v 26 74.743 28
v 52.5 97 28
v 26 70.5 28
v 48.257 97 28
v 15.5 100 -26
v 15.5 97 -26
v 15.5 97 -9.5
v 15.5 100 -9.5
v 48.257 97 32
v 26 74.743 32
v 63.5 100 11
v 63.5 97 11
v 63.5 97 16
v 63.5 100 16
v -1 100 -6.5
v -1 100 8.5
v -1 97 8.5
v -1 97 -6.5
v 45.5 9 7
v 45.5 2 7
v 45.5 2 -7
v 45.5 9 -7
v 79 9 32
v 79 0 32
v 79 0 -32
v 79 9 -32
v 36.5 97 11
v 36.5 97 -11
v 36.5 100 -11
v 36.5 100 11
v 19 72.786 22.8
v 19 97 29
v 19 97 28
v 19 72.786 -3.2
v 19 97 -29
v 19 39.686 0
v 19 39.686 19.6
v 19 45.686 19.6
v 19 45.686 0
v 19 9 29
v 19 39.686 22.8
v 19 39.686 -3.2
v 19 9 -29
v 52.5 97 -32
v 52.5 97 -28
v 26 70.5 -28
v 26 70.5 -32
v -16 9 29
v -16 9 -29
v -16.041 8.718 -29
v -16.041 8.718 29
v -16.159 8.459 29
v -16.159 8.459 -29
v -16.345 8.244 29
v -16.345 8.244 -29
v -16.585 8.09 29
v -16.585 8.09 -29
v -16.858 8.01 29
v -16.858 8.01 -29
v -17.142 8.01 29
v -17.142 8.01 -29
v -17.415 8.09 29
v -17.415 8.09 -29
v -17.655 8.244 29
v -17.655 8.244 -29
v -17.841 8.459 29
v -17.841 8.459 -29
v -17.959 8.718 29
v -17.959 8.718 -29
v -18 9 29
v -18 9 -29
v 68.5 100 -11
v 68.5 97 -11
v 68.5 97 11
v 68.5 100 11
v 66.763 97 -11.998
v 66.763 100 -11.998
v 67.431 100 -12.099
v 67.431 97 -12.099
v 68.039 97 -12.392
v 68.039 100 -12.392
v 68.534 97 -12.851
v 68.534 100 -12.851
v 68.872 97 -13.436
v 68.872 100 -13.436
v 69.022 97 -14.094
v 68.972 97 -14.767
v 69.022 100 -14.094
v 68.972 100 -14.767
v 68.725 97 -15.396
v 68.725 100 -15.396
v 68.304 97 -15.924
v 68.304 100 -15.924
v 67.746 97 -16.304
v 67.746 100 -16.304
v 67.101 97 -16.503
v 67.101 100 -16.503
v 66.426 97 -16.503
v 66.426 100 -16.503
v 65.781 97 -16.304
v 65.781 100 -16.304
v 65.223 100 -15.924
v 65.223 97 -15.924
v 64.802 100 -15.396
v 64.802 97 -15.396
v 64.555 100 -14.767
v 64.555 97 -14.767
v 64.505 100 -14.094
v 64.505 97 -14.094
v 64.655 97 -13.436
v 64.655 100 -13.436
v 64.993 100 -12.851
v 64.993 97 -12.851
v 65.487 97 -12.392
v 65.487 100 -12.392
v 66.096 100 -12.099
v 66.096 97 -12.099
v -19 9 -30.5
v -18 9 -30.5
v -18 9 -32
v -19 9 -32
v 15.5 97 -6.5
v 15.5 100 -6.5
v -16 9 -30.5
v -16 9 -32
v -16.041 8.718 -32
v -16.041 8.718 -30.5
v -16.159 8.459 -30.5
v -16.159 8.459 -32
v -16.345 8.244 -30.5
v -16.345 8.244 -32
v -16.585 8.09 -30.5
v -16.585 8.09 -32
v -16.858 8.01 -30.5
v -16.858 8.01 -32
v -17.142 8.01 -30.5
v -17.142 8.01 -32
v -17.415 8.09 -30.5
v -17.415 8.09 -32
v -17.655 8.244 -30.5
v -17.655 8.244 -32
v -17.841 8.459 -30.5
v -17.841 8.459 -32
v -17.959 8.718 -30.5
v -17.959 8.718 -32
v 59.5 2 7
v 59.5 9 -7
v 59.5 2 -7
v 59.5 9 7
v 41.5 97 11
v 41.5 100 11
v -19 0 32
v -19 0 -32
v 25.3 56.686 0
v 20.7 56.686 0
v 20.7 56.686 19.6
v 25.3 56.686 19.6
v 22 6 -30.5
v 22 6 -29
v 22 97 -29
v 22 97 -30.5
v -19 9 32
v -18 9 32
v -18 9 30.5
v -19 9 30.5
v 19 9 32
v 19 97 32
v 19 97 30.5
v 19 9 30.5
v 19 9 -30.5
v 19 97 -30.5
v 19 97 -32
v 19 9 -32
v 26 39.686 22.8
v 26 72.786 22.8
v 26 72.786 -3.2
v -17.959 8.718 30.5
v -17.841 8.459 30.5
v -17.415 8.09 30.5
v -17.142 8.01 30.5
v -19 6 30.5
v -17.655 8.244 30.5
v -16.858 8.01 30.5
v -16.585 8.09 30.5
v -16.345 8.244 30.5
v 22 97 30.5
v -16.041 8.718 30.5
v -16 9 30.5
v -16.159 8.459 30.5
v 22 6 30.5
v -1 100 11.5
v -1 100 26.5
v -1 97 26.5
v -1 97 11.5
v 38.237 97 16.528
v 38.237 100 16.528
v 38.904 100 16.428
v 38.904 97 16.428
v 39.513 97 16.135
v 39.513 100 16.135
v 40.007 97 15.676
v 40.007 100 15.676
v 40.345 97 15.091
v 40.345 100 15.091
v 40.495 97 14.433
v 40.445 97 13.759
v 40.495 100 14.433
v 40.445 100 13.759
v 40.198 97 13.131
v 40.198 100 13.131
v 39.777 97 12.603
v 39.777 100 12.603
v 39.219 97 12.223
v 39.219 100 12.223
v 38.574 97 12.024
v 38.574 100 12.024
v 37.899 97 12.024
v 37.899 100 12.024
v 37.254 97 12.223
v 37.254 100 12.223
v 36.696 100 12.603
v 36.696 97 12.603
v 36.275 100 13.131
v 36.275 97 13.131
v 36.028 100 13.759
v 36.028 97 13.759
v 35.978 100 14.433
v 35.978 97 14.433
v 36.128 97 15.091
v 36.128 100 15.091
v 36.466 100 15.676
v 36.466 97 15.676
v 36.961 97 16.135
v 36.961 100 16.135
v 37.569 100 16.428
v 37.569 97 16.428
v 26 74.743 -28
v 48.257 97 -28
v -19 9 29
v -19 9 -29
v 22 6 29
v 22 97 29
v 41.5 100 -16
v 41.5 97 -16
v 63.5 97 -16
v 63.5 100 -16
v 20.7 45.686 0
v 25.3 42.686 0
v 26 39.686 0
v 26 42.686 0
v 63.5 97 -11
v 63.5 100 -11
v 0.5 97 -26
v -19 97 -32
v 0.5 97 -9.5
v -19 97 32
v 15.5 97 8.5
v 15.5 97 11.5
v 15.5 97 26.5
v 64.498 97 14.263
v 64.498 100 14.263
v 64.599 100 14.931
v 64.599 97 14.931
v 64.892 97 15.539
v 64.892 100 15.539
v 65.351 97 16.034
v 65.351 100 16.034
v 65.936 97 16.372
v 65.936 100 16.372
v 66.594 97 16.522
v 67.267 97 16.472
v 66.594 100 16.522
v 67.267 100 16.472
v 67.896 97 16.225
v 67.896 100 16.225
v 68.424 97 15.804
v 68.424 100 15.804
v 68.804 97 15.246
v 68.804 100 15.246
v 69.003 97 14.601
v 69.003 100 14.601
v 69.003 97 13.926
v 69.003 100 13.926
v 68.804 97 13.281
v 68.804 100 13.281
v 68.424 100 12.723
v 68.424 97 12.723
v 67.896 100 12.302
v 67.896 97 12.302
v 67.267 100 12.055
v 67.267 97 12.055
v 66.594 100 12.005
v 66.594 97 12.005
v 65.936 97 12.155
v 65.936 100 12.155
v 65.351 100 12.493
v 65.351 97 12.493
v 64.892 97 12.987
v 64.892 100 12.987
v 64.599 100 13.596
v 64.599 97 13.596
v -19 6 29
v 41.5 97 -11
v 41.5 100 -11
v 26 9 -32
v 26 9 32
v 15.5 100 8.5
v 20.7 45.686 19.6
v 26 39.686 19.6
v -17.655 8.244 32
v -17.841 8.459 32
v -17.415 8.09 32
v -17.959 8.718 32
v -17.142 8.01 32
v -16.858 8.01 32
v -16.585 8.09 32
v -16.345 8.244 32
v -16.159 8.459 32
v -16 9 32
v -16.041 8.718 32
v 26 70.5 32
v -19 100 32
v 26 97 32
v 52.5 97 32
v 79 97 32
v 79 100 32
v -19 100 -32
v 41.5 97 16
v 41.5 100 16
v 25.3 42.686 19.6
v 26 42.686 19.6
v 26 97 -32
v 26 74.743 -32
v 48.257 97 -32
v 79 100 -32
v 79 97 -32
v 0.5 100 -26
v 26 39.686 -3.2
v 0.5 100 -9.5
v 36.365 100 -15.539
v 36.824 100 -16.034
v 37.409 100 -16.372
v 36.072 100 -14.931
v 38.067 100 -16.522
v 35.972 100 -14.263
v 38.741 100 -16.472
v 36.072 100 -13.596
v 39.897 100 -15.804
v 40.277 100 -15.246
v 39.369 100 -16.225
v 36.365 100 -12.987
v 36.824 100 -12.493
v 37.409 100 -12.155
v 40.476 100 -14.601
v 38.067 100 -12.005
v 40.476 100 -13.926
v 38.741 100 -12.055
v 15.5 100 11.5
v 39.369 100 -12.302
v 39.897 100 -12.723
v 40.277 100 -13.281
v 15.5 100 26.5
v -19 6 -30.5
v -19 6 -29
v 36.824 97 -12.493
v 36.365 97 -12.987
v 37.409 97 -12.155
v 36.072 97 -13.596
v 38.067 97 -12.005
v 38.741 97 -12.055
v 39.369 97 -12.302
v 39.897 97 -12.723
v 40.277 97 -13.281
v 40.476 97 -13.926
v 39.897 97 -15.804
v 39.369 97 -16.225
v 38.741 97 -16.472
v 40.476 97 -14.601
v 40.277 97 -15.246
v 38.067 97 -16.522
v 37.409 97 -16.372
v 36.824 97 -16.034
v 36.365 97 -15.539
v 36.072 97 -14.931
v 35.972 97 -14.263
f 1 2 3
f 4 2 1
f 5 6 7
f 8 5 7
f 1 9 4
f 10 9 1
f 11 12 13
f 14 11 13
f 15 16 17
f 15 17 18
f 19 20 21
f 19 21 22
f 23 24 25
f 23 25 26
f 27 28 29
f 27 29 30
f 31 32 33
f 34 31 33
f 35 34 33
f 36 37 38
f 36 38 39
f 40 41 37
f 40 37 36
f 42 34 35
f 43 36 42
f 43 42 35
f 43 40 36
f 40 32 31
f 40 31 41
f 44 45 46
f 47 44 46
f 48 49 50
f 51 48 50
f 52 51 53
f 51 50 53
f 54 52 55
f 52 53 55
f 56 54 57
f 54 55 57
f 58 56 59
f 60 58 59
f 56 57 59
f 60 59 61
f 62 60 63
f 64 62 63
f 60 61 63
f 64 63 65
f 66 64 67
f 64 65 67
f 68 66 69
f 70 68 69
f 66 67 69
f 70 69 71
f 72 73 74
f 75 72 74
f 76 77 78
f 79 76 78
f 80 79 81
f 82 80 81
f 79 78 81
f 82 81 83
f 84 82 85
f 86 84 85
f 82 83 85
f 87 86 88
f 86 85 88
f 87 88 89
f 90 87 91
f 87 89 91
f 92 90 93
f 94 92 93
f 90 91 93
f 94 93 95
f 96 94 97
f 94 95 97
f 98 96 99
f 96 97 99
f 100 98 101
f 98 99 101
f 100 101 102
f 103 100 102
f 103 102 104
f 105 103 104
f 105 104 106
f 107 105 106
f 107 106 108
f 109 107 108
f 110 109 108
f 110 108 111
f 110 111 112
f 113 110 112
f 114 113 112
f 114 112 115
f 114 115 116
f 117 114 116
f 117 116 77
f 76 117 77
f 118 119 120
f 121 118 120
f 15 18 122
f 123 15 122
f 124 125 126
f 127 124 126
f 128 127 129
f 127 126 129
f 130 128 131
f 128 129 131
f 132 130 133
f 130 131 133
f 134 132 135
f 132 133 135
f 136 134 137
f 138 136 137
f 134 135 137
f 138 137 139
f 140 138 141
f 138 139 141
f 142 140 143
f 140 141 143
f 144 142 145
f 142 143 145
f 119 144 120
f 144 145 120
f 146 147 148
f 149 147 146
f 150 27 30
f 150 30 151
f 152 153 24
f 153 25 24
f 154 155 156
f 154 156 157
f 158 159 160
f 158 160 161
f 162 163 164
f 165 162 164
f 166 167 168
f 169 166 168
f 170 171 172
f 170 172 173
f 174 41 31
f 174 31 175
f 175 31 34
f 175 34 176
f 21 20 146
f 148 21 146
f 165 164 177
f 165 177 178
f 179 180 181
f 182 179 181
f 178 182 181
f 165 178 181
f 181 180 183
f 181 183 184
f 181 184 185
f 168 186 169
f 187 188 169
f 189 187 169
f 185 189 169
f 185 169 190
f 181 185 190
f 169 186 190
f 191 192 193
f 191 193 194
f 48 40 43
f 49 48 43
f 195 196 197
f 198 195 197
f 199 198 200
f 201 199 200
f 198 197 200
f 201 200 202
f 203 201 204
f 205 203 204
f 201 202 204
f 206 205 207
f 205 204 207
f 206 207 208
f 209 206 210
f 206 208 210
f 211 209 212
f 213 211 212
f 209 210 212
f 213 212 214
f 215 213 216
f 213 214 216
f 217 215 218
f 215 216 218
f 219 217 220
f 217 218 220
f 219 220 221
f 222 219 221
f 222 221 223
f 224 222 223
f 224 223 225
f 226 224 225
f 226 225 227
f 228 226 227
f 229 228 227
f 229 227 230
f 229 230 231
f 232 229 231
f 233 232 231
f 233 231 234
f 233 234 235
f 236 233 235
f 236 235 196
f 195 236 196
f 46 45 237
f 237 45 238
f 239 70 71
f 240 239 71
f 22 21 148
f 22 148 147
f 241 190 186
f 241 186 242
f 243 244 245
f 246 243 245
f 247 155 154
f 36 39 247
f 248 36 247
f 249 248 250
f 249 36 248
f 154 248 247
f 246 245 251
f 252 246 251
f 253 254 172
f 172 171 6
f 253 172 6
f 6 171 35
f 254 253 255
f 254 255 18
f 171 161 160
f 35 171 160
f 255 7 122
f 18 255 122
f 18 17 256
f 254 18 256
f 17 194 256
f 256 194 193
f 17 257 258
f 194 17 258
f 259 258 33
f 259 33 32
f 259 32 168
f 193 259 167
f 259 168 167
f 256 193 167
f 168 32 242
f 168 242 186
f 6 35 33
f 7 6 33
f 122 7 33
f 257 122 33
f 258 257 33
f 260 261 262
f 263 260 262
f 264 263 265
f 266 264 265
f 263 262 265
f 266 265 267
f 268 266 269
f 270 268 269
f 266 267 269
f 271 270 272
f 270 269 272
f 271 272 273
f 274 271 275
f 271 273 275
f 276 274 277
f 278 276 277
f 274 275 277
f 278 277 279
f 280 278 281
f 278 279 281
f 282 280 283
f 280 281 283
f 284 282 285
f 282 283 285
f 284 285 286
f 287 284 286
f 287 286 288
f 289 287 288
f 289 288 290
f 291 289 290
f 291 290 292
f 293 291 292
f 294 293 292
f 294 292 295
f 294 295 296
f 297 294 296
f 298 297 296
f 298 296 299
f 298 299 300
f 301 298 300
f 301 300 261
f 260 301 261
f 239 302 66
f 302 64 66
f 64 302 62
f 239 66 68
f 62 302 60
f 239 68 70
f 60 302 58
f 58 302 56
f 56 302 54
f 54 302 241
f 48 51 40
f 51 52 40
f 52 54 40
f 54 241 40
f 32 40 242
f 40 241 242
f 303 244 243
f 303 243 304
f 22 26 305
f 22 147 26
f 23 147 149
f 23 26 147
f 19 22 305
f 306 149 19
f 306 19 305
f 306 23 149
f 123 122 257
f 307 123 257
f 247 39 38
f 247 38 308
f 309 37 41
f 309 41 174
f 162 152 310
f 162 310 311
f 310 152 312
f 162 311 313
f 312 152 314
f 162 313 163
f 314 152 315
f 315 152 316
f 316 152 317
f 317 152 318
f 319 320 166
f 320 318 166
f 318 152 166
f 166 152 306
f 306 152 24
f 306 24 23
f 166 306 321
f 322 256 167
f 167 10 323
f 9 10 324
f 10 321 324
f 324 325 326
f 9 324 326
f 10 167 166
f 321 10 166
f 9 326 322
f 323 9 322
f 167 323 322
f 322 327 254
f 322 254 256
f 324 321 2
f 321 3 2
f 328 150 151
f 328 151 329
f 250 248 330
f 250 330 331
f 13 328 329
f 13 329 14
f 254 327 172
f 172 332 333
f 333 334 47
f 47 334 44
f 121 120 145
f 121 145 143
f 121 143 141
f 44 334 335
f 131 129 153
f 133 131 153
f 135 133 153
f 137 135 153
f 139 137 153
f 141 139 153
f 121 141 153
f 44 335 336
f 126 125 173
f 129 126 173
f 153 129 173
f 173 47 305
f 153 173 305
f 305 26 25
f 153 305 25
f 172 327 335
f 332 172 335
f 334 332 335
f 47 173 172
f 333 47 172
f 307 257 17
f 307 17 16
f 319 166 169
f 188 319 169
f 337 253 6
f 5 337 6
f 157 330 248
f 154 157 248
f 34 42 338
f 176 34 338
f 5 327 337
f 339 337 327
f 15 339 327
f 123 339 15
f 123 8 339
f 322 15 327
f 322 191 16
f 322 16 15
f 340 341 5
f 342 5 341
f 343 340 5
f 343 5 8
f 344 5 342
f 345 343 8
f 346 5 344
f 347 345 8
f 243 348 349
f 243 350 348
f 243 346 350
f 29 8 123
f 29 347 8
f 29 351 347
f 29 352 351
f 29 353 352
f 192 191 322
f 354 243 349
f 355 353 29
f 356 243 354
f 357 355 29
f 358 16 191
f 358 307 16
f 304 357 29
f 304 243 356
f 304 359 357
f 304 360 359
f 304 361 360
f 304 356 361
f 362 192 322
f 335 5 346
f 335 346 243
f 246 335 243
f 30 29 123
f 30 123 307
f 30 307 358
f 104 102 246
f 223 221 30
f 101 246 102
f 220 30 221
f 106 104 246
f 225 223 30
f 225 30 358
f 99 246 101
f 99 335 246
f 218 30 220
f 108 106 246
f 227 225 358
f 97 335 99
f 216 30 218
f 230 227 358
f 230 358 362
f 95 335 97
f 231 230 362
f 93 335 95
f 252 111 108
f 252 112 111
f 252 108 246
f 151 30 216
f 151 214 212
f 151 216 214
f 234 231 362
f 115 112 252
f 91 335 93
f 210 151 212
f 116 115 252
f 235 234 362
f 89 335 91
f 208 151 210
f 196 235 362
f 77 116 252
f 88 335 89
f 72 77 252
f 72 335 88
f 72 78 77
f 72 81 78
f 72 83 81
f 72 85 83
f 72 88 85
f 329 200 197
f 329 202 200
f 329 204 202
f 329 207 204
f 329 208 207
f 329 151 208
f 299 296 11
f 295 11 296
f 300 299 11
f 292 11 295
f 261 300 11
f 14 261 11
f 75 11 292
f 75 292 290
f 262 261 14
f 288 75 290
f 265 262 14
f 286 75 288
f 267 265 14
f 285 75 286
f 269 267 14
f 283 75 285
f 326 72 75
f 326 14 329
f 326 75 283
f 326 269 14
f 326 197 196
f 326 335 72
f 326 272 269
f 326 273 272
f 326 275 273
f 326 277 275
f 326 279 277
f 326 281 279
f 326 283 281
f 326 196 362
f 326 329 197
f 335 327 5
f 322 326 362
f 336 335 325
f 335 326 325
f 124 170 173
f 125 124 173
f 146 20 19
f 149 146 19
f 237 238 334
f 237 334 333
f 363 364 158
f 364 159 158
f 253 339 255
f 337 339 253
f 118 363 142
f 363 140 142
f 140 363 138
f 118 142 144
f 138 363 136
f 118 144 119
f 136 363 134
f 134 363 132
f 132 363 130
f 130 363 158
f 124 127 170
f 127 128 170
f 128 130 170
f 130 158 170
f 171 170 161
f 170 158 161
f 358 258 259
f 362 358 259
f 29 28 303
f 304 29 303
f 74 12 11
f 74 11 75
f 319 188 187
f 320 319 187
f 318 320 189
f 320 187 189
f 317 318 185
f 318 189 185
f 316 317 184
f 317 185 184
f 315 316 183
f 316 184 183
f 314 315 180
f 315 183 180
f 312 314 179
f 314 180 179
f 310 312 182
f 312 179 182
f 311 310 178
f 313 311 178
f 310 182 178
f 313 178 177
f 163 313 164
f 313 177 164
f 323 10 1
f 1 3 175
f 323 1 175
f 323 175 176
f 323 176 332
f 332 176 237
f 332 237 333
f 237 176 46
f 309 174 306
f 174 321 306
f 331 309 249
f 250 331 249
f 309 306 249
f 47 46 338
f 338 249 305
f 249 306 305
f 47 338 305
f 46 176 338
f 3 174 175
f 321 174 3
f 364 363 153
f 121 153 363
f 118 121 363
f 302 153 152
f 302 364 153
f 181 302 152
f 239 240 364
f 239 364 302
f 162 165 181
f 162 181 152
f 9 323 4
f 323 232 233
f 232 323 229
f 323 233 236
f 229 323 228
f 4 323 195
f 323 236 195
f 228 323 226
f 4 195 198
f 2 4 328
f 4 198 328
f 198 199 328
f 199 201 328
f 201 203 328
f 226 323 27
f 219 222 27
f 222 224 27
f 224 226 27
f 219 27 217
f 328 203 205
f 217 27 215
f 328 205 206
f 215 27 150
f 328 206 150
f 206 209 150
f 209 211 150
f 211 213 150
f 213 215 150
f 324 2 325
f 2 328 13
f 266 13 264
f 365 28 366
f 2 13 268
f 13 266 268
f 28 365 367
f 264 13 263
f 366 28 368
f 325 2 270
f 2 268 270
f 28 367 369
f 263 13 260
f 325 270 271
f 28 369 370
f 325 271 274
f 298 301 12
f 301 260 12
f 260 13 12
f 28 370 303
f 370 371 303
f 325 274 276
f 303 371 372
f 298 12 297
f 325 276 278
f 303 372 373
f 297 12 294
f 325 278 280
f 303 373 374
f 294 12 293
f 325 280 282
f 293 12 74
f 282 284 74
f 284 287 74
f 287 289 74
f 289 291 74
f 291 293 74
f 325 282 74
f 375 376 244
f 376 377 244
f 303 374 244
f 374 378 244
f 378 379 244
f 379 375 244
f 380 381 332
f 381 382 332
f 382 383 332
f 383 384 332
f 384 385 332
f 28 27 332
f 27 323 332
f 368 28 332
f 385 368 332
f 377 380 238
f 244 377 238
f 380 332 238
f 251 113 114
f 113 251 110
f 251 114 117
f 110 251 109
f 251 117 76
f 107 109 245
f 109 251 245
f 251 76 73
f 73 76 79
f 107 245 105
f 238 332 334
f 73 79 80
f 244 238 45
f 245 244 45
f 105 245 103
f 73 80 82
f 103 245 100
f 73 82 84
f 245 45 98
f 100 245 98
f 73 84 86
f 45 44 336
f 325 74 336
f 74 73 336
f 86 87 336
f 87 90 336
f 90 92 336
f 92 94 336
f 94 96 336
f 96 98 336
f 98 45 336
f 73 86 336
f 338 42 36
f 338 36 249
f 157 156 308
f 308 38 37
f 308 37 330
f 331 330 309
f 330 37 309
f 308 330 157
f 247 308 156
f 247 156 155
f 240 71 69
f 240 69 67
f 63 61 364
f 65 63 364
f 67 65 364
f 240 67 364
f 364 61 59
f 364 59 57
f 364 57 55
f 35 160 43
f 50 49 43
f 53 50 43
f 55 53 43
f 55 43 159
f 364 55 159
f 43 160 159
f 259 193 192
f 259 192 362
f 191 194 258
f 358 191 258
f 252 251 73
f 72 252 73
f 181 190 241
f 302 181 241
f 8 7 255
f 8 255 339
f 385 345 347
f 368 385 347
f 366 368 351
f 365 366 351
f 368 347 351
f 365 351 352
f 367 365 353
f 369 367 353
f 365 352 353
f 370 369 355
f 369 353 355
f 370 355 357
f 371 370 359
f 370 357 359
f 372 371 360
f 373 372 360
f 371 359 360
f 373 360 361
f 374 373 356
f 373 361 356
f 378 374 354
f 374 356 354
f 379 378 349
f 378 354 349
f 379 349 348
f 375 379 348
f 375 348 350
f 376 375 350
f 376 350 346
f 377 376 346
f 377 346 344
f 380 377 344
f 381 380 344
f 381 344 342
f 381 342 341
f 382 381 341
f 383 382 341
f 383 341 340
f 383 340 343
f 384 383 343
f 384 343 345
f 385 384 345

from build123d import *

# Parameters (mm, degrees)
EXTRUDE_2_DEPTH           = 31
SKETCH_2_W                = 8
SKETCH_2_H                = 8
CUT_EXTRUDE_1_DEPTH       = 4
EXTRUDE_4_DEPTH           = 3
EXTRUDE_5_DEPTH           = 3
SKETCH_10_W               = 22
SKETCH_10_H               = 11
CUT_EXTRUDE_2_DEPTH       = 118.345643294
SKETCH_11_W               = 0.7
SKETCH_11_H               = 28
CUT_EXTRUDE_3_DEPTH       = 118.345643294
SKETCH_12_W               = 0.7
SKETCH_12_H               = 28
CUT_EXTRUDE_4_DEPTH       = 118.345643294
SKETCH_13_W               = 20.6
SKETCH_13_H               = 11
CUT_EXTRUDE_6_DEPTH       = 0.7
SKETCH_15_W               = 20.6
SKETCH_15_H               = 14
CUT_EXTRUDE_7_DEPTH       = 0.7
SKETCH_17_W               = 15
SKETCH_17_H               = 15
CUT_EXTRUDE_8_DEPTH       = 129.883668477
SKETCH_18_W               = 62
SKETCH_18_H               = 3
EXTRUDE_6_DEPTH           = 3
SKETCH_20_W               = 62
SKETCH_20_H               = 9
EXTRUDE_7_DEPTH           = 3
SKETCH_22_W               = 15
SKETCH_22_H               = 15
CUT_EXTRUDE_10_DEPTH      = 129.883668477
SKETCH_23_W               = 13.5
SKETCH_23_H               = 16.5
CUT_EXTRUDE_11_DEPTH      = 129.883668477
SKETCH_26_W               = 32
SKETCH_26_H               = 22
CUT_EXTRUDE_14_DEPTH      = 129.883668477
SKETCH_29_W               = 22
SKETCH_29_H               = 32
CUT_EXTRUDE_15_DEPTH      = 129.883668477
CUT_EXTRUDE_16_REACH      = 133.156
SKETCH_30_R               = 1.263405553
SKETCH_31_W               = 25
SKETCH_31_H               = 1.5
CUT_EXTRUDE_18_DEPTH      = 3
SKETCH_32_W               = 3
SKETCH_32_H               = 1.5
CUT_EXTRUDE_19_DEPTH      = 88
SKETCH_33_W               = 3
SKETCH_33_H               = 1.5
CUT_EXTRUDE_20_DEPTH      = 17
SKETCH_34_W               = 1.5
SKETCH_34_H               = 43.313673025
CUT_EXTRUDE_21_DEPTH      = 3
SKETCH_35_R               = 1
CUT_EXTRUDE_23_DEPTH      = 142.721557993
SKETCH_39_R               = 2.265
CUT_EXTRUDE_24_DEPTH      = 10
SKETCH_40_W               = 15
SKETCH_40_H               = 3
CUT_EXTRUDE_25_DEPTH      = 1.5
SKETCH_41_W               = 15
SKETCH_41_H               = 3
CUT_EXTRUDE_26_DEPTH      = 1.5
SKETCH_42_W               = 16.5
SKETCH_42_H               = 3
CUT_EXTRUDE_27_DEPTH      = 1.5
SKETCH_43_W               = 7
SKETCH_43_H               = 28
CUT_EXTRUDE_28_DEPTH      = 1.5
CUT_EXTRUDE_29_DEPTH      = 1
SKETCH_45_W               = 19.6
SKETCH_45_H               = 11
CUT_EXTRUDE_30_DEPTH      = 1
EXTRUDE_8_DEPTH           = 1
EXTRUDE_START             = 1
EXTRUDE_9_DEPTH           = 1
EXTRUDE_10_DEPTH          = 1
CUT_EXTRUDE_31_DEPTH      = 1
EXTRUDE_11_DEPTH          = 1
SKETCH_51_W               = 3
SKETCH_51_H               = 43.313673025
CUT_EXTRUDE_32_DEPTH      = 1
SKETCH_52_W               = 3
SKETCH_52_H               = 43.313673025
EXTRUDE_12_DEPTH          = 1
CUT_EXTRUDE_START         = -1
CUT_EXTRUDE_33_DEPTH      = 1
EXTRUDE_13_DEPTH          = 1
SKETCH_56_W               = 64
SKETCH_56_H               = 3
EXTRUDE_14_DEPTH          = 1
EXTRUDE_15_DEPTH          = 1
CUT_EXTRUDE_34_DEPTH      = 12.1
SKETCH_60_W               = 7.5
SKETCH_60_H               = 40.1
CUT_EXTRUDE_35_DEPTH      = 118.613774703
EXTRUDE_16_DEPTH          = 7.5
CUT_EXTRUDE_37_DEPTH      = 7.5
SKETCH_63_W               = 6.2
SKETCH_63_H               = 0.313673025
CUT_EXTRUDE_38_DEPTH      = 120.469661421
SKETCH_66_W               = 7
SKETCH_66_H               = 40.1
CUT_EXTRUDE_39_DEPTH      = 3.2
EXTRUDE_17_DEPTH          = 3.2
CUT_EXTRUDE_40_DEPTH      = 3.2
EXTRUDE_18_DEPTH          = 48.2
SKETCH_71_W               = 4.6
SKETCH_71_H               = 19.6
EXTRUDE_19_DEPTH          = 14
SKETCH_72_W               = 0.7
SKETCH_72_H               = 19.6
EXTRUDE_20_DEPTH          = 14
SKETCH_73_W               = 1.7
SKETCH_73_H               = 19.6
EXTRUDE_21_DEPTH          = 14
SKETCH_74_W               = 7
SKETCH_74_H               = 26
CUT_EXTRUDE_41_DEPTH      = 5
SKETCH_75_W               = 7
SKETCH_75_H               = 26
CUT_EXTRUDE_42_DEPTH      = 2
SKETCH_76_W               = 7
SKETCH_76_H               = 3.2
EXTRUDE_22_DEPTH          = 14
SKETCH_77_W               = 7
SKETCH_77_H               = 3.2
EXTRUDE_23_DEPTH          = 14
CUT_EXTRUDE_43_DEPTH      = 143.16187956
CUT_EXTRUDE_43_DEPTH_BACK = 143.16187956
SKETCH_79_W               = 8
SKETCH_79_H               = 4
CUT_EXTRUDE_44_DEPTH      = 3
SKETCH_80_W               = 11
SKETCH_80_H               = 4
CUT_EXTRUDE_45_DEPTH      = 3
SKETCH_81_W               = 11
SKETCH_81_H               = 4
CUT_EXTRUDE_46_DEPTH      = 3
SKETCH_82_W               = 14
SKETCH_82_H               = 4
CUT_EXTRUDE_47_DEPTH      = 3
SKETCH_83_W               = 14
SKETCH_83_H               = 14
CUT_EXTRUDE_48_DEPTH      = 3
SKETCH_84_W               = 64
SKETCH_84_H               = 3
EXTRUDE_24_DEPTH          = 15
EXTRUDE_25_DEPTH          = 15
EXTRUDE_26_DEPTH          = 20
SKETCH_87_R               = 1
CUT_EXTRUDE_49_DEPTH      = 143.607853921


with BuildPart() as part:
    # 草图1 → 凸台-拉伸2 (new, symmetric)
    with BuildSketch(Plane.XY):
        Polygon((0, 0), (79, 0), (79, 9), (26, 9), (26, 97), (79, 97), (79, 100), (0, 100), (0, 97), (19, 97), (19, 9), (0, 9), align=None)
    extrude(amount=EXTRUDE_2_DEPTH, both=True)

    # 草图2 → 切除-拉伸1 (cut)
    with BuildSketch(Plane(origin=(0, 9, 0), x_dir=(1, 0, 0), z_dir=(0, 1, 0))):
        with Locations((52.5, 0)):
            Rectangle(SKETCH_2_W, SKETCH_2_H)
    extrude(amount=-CUT_EXTRUDE_1_DEPTH, mode=Mode.SUBTRACT)

    # 草图5 → 凸台-拉伸4 (add)
    with BuildSketch(Plane.XY.offset(31)):
        Polygon((26, 70.5), (26, 74.742640687), (48.257359313, 97), (52.5, 97), align=None)
    extrude(amount=-EXTRUDE_4_DEPTH)

    # 草图9 → 凸台-拉伸5 (add)
    with BuildSketch(Plane(origin=(0, 0, -31), x_dir=(-1, 0, 0), z_dir=(0, 0, -1))):
        Polygon((-52.5, 97), (-26, 70.5), (-26, 74.742640687), (-48.257359313, 97), align=None)
    extrude(amount=-EXTRUDE_5_DEPTH)

    # 草图10 → 切除-拉伸2 (cut, through all)
    with BuildSketch(Plane(origin=(26, 0, 0), x_dir=(0, 0, -1), z_dir=(1, 0, 0))):
        with Locations((-20, 48.186326975)):
            Rectangle(SKETCH_10_W, SKETCH_10_H)
    extrude(amount=-CUT_EXTRUDE_2_DEPTH, mode=Mode.SUBTRACT)

    # 草图11 → 切除-拉伸3 (cut, through all)
    with BuildSketch(Plane(origin=(26, 0, 0), x_dir=(0, 0, -1), z_dir=(1, 0, 0))):
        with Locations((-9.35, 39.686326975)):
            Rectangle(SKETCH_11_W, SKETCH_11_H)
    extrude(amount=-CUT_EXTRUDE_3_DEPTH, mode=Mode.SUBTRACT)

    # 草图12 → 切除-拉伸4 (cut, through all)
    with BuildSketch(Plane(origin=(26, 0, 0), x_dir=(0, 0, -1), z_dir=(1, 0, 0))):
        with Locations((-30.65, 39.686326975)):
            Rectangle(SKETCH_12_W, SKETCH_12_H)
    extrude(amount=-CUT_EXTRUDE_4_DEPTH, mode=Mode.SUBTRACT)

    # 草图13 → 切除-拉伸6 (cut)
    with BuildSketch(Plane.ZY.offset(-19)):
        with Locations((20, 37.186326975)):
            Rectangle(SKETCH_13_W, SKETCH_13_H)
    extrude(amount=-CUT_EXTRUDE_6_DEPTH, mode=Mode.SUBTRACT)

    # 草图15 → 切除-拉伸7 (cut)
    with BuildSketch(Plane(origin=(26, 0, 0), x_dir=(0, 0, -1), z_dir=(1, 0, 0))):
        with Locations((-20, 35.686326975)):
            Rectangle(SKETCH_15_W, SKETCH_15_H)
    extrude(amount=-CUT_EXTRUDE_7_DEPTH, mode=Mode.SUBTRACT)

    # 草图17 → 切除-拉伸8 (cut, through all)
    with BuildSketch(Plane.XZ.offset(-97)):
        with Locations((8, 19)):
            Rectangle(SKETCH_17_W, SKETCH_17_H)
    extrude(amount=-CUT_EXTRUDE_8_DEPTH, mode=Mode.SUBTRACT)

    # 草图18 → 凸台-拉伸6 (add)
    with BuildSketch(Plane.ZY):
        with Locations((0, 98.5)):
            Rectangle(SKETCH_18_W, SKETCH_18_H)
    extrude(amount=EXTRUDE_6_DEPTH)

    # 草图20 → 凸台-拉伸7 (add)
    with BuildSketch(Plane.ZY):
        with Locations((0, 4.5)):
            Rectangle(SKETCH_20_W, SKETCH_20_H)
    extrude(amount=EXTRUDE_7_DEPTH)

    # 草图22 → 切除-拉伸10 (cut, through all)
    with BuildSketch(Plane.XZ.offset(-97)):
        with Locations((8, 1)):
            Rectangle(SKETCH_22_W, SKETCH_22_H)
    extrude(amount=-CUT_EXTRUDE_10_DEPTH, mode=Mode.SUBTRACT)

    # 草图23 → 切除-拉伸11 (cut, through all)
    with BuildSketch(Plane.XZ.offset(-97)):
        with Locations((8.75, -17.75)):
            Rectangle(SKETCH_23_W, SKETCH_23_H)
    extrude(amount=-CUT_EXTRUDE_11_DEPTH, mode=Mode.SUBTRACT)

    # 草图26 → 切除-拉伸14 (cut, through all)
    with BuildSketch(Plane.XZ.offset(-97)):
        with Locations((52.5, 0)):
            Rectangle(SKETCH_26_W, SKETCH_26_H)
    extrude(amount=-CUT_EXTRUDE_14_DEPTH, mode=Mode.SUBTRACT)

    # 草图29 → 切除-拉伸15 (cut, through all)
    with BuildSketch(Plane.XZ.offset(-97)):
        with Locations((52.5, 0)):
            Rectangle(SKETCH_29_W, SKETCH_29_H)
    extrude(amount=-CUT_EXTRUDE_15_DEPTH, mode=Mode.SUBTRACT)

    # 草图30 → 切除-拉伸16 (cut, up to next)
    with BuildSketch(Plane(origin=(0, 100, 0), x_dir=(1, 0, 0), z_dir=(0, 1, 0)), mode=Mode.PRIVATE) as cut_extrude_16_sk1:
        with Locations((38.236594447, -14.263405553)):
            Circle(SKETCH_30_R)
    cut_extrude_16_tool1 = extrude(cut_extrude_16_sk1.sketch, amount=-CUT_EXTRUDE_16_REACH, mode=Mode.PRIVATE) & part.part
    # 草图30 → 切除-拉伸16 (cut, up to next)
    with BuildSketch(Plane(origin=(0, 100, 0), x_dir=(1, 0, 0), z_dir=(0, 1, 0)), mode=Mode.PRIVATE) as cut_extrude_16_sk2:
        with Locations((66.763405553, -14.263405553)):
            Circle(SKETCH_30_R)
    cut_extrude_16_tool2 = extrude(cut_extrude_16_sk2.sketch, amount=-CUT_EXTRUDE_16_REACH, mode=Mode.PRIVATE) & part.part
    # 草图30 → 切除-拉伸16 (cut, up to next)
    with BuildSketch(Plane(origin=(0, 100, 0), x_dir=(1, 0, 0), z_dir=(0, 1, 0)), mode=Mode.PRIVATE) as cut_extrude_16_sk3:
        with Locations((66.763405553, 14.263405553)):
            Circle(SKETCH_30_R)
    cut_extrude_16_tool3 = extrude(cut_extrude_16_sk3.sketch, amount=-CUT_EXTRUDE_16_REACH, mode=Mode.PRIVATE) & part.part
    # 草图30 → 切除-拉伸16 (cut, up to next)
    with BuildSketch(Plane(origin=(0, 100, 0), x_dir=(1, 0, 0), z_dir=(0, 1, 0)), mode=Mode.PRIVATE) as cut_extrude_16_sk4:
        with Locations((38.236594447, 14.263405553)):
            Circle(SKETCH_30_R)
    cut_extrude_16_tool4 = extrude(cut_extrude_16_sk4.sketch, amount=-CUT_EXTRUDE_16_REACH, mode=Mode.PRIVATE) & part.part
    add(cut_extrude_16_tool1.solids().sort_by_distance((38.236594, 100, 14.263406))[0], mode=Mode.SUBTRACT)
    add(cut_extrude_16_tool2.solids().sort_by_distance((66.763406, 100, 14.263406))[0], mode=Mode.SUBTRACT)
    add(cut_extrude_16_tool3.solids().sort_by_distance((66.763406, 100, -14.263406))[0], mode=Mode.SUBTRACT)
    add(cut_extrude_16_tool4.solids().sort_by_distance((38.236594, 100, -14.263406))[0], mode=Mode.SUBTRACT)

    # 草图31 → 切除-拉伸18 (cut)
    with BuildSketch(Plane(origin=(0, 9, 0), x_dir=(1, 0, 0), z_dir=(0, 1, 0))):
        with Locations((9.5, 28.75)):
            Rectangle(SKETCH_31_W, SKETCH_31_H)
        with Locations((9.5, -28.75)):
            Rectangle(SKETCH_31_W, SKETCH_31_H)
    extrude(amount=-CUT_EXTRUDE_18_DEPTH, mode=Mode.SUBTRACT)

    # 草图32 → 切除-拉伸19 (cut)
    with BuildSketch(Plane.XZ.offset(-9)):
        with Locations((20.5, -28.75)):
            Rectangle(SKETCH_32_W, SKETCH_32_H)
    extrude(amount=-CUT_EXTRUDE_19_DEPTH, mode=Mode.SUBTRACT)

    # 草图33 → 切除-拉伸20 (cut)
    with BuildSketch(Plane.XZ.offset(-9)):
        with Locations((20.5, 28.75)):
            Rectangle(SKETCH_33_W, SKETCH_33_H)
    extrude(amount=-CUT_EXTRUDE_20_DEPTH, mode=Mode.SUBTRACT)

    # 草图34 → 切除-拉伸21 (cut)
    with BuildSketch(Plane.ZY.offset(-19)):
        with Locations((28.75, 75.343163487)):
            Rectangle(SKETCH_34_W, SKETCH_34_H)
    extrude(amount=-CUT_EXTRUDE_21_DEPTH, mode=Mode.SUBTRACT)

    # 草图35 → 切除-拉伸23 (cut, through all)
    with BuildSketch(Plane.XY.offset(31)):
        with Locations((-1, 9)):
            Circle(SKETCH_35_R)
    extrude(amount=-CUT_EXTRUDE_23_DEPTH, mode=Mode.SUBTRACT)

    # 草图39 → 切除-拉伸24 (cut)
    with BuildSketch(Plane(origin=(0, 100, 0), x_dir=(1, 0, 0), z_dir=(0, 1, 0))):
        with Locations((66.763405553, -14.263405553)):
            Circle(SKETCH_39_R)
        with Locations((38.236594447, -14.263405553)):
            Circle(SKETCH_39_R)
        with Locations((66.763405553, 14.263405553)):
            Circle(SKETCH_39_R)
        with Locations((38.236594447, 14.263405553)):
            Circle(SKETCH_39_R)
    extrude(amount=-CUT_EXTRUDE_24_DEPTH, mode=Mode.SUBTRACT)

    # 草图40 → 切除-拉伸25 (cut)
    with BuildSketch(Plane(origin=(0.5, 0, 0), x_dir=(0, 0, -1), z_dir=(1, 0, 0))):
        with Locations((-19, 98.5)):
            Rectangle(SKETCH_40_W, SKETCH_40_H)
    extrude(amount=-CUT_EXTRUDE_25_DEPTH, mode=Mode.SUBTRACT)

    # 草图41 → 切除-拉伸26 (cut)
    with BuildSketch(Plane(origin=(0.5, 0, 0), x_dir=(0, 0, -1), z_dir=(1, 0, 0))):
        with Locations((-1, 98.5)):
            Rectangle(SKETCH_41_W, SKETCH_41_H)
    extrude(amount=-CUT_EXTRUDE_26_DEPTH, mode=Mode.SUBTRACT)

    # 草图42 → 切除-拉伸27 (cut)
    with BuildSketch(Plane(origin=(2, 0, 0), x_dir=(0, 0, -1), z_dir=(1, 0, 0))):
        with Locations((17.75, 98.5)):
            Rectangle(SKETCH_42_W, SKETCH_42_H)
    extrude(amount=-CUT_EXTRUDE_27_DEPTH, mode=Mode.SUBTRACT)

    # 草图43 → 切除-拉伸28 (cut)
    with BuildSketch(Plane.XY.offset(9)):
        with Locations((22.5, 39.686326975)):
            Rectangle(SKETCH_43_W, SKETCH_43_H)
    extrude(amount=-CUT_EXTRUDE_28_DEPTH, mode=Mode.SUBTRACT)

    # 草图44 → 切除-拉伸29 (cut)
    with BuildSketch(Plane(origin=(0, 0, 9.7), x_dir=(-1, 0, 0), z_dir=(0, 0, -1))):
        Polygon((-25.3, 42.686326975), (-25.3, 28.686326975), (-26, 28.686326975), (-26, 25.686326975), (-19, 25.686326975), (-19, 31.686326975), (-19.7, 31.686326975), (-19.7, 42.686326975), align=None)
    extrude(amount=-CUT_EXTRUDE_29_DEPTH, mode=Mode.SUBTRACT)

    # 草图45 → 切除-拉伸30 (cut)
    with BuildSketch(Plane.ZY.offset(-19.7)):
        with Locations((20.5, 37.186326975)):
            Rectangle(SKETCH_45_W, SKETCH_45_H)
    extrude(amount=-CUT_EXTRUDE_30_DEPTH, mode=Mode.SUBTRACT)

    # 草图46 → 凸台-拉伸8 (add)
    with BuildSketch(Plane.XY.offset(31)):
        Polygon((19, 53.686326975), (26, 53.686326975), (26, 70.5), (52.5, 97), (79, 97), (79, 100), (-3, 100), (-3, 97), (19, 97), align=None)
    extrude(amount=EXTRUDE_8_DEPTH)

    # 草图47 → 凸台-拉伸9 (add)
    with BuildSketch(Plane.XY.offset(31).offset(EXTRUDE_START)):
        with BuildLine():
            Line((-2, 9), (-3, 9))
            Line((-3, 9), (-3, 0))
            Line((-3, 0), (79, 0))
            Line((79, 0), (79, 9))
            Line((79, 9), (26, 9))
            Line((26, 9), (26, 25.686326975))
            Line((26, 25.686326975), (19, 25.686326975))
            Line((19, 25.686326975), (19, 9))
            Line((19, 9), (0, 9))
            ThreePointArc((0, 9), (-1, 8), (-2, 9))
        make_face()
    extrude(amount=-EXTRUDE_9_DEPTH)

    # 草图48 → 凸台-拉伸10 (add)
    with BuildSketch(Plane(origin=(0, 0, -31), x_dir=(-1, 0, 0), z_dir=(0, 0, -1))):
        with BuildLine():
            Line((3, 9), (2, 9))
            ThreePointArc((2, 9), (1, 8), (0, 9))
            Line((0, 9), (-19, 9))
            Line((-19, 9), (-19, 97))
            Line((-19, 97), (3, 97))
            Line((3, 97), (3, 100))
            Line((3, 100), (-79, 100))
            Line((-79, 100), (-79, 97))
            Line((-79, 97), (-52.5, 97))
            Line((-52.5, 97), (-26, 70.5))
            Line((-26, 70.5), (-26, 9))
            Line((-26, 9), (-79, 9))
            Line((-79, 9), (-79, 0))
            Line((-79, 0), (3, 0))
            Line((3, 0), (3, 9))
        make_face()
    extrude(amount=EXTRUDE_10_DEPTH)

    # 草图49 → 切除-拉伸31 (cut)
    with BuildSketch(Plane.XY.offset(-29.5)):
        with BuildLine():
            Line((19, 9), (0, 9))
            ThreePointArc((0, 9), (-1, 8), (-2, 9))
            Line((-2, 9), (-3, 9))
            Line((-3, 9), (-3, 6))
            Line((-3, 6), (22, 6))
            Line((22, 6), (22, 97))
            Line((22, 97), (19, 97))
            Line((19, 97), (19, 9))
        make_face()
    extrude(amount=-CUT_EXTRUDE_31_DEPTH, mode=Mode.SUBTRACT)

    # 草图50 → 凸台-拉伸11 (add)
    with BuildSketch(Plane(origin=(0, 0, -28), x_dir=(-1, 0, 0), z_dir=(0, 0, -1))):
        with BuildLine():
            Line((3, 9), (2, 9))
            ThreePointArc((2, 9), (1, 8), (0, 9))
            Line((0, 9), (-19, 9))
            Line((-19, 9), (-19, 97))
            Line((-19, 97), (-22, 97))
            Line((-22, 97), (-22, 6))
            Line((-22, 6), (3, 6))
            Line((3, 6), (3, 9))
        make_face()
    extrude(amount=EXTRUDE_11_DEPTH)

    # 草图51 → 切除-拉伸32 (cut)
    with BuildSketch(Plane(origin=(0, 0, 29.5), x_dir=(-1, 0, 0), z_dir=(0, 0, -1))):
        with Locations((-20.5, 75.343163487)):
            Rectangle(SKETCH_51_W, SKETCH_51_H)
    extrude(amount=-CUT_EXTRUDE_32_DEPTH, mode=Mode.SUBTRACT)

    # 草图52 → 凸台-拉伸12 (add)
    with BuildSketch(Plane.XY.offset(28)):
        with Locations((20.5, 75.343163487)):
            Rectangle(SKETCH_52_W, SKETCH_52_H)
    extrude(amount=EXTRUDE_12_DEPTH)

    # 草图53 → 切除-拉伸33 (cut)
    with BuildSketch(Plane(origin=(0, 0, 29.5), x_dir=(-1, 0, 0), z_dir=(0, 0, -1)).offset(CUT_EXTRUDE_START)):
        with BuildLine():
            Line((3, 9), (2, 9))
            ThreePointArc((2, 9), (1, 8), (0, 9))
            Line((0, 9), (-19, 9))
            Line((-19, 9), (-19, 26))
            Line((-19, 26), (-22, 26))
            Line((-22, 26), (-22, 6))
            Line((-22, 6), (3, 6))
            Line((3, 6), (3, 9))
        make_face()
    extrude(amount=CUT_EXTRUDE_33_DEPTH, mode=Mode.SUBTRACT)

    # 草图54 → 凸台-拉伸13 (add)
    with BuildSketch(Plane.XY.offset(28).offset(EXTRUDE_START)):
        with BuildLine():
            Line((19, 9), (0, 9))
            ThreePointArc((0, 9), (-1, 8), (-2, 9))
            Line((-2, 9), (-3, 9))
            Line((-3, 9), (-3, 6))
            Line((-3, 6), (22, 6))
            Line((22, 6), (22, 26))
            Line((22, 26), (19, 26))
            Line((19, 26), (19, 9))
        make_face()
    extrude(amount=-EXTRUDE_13_DEPTH)

    # 草图56 → 凸台-拉伸14 (add)
    with BuildSketch(Plane.ZY.offset(3)):
        with Locations((0, 98.5)):
            Rectangle(SKETCH_56_W, SKETCH_56_H)
    extrude(amount=EXTRUDE_14_DEPTH)

    # 草图57 → 凸台-拉伸15 (add)
    with BuildSketch(Plane.ZY.offset(3)):
        Polygon((29, 6), (29, 9), (-29, 9), (-29, 6), (-30.5, 6), (-30.5, 9), (-32, 9), (-32, 0), (32, 0), (32, 9), (30.5, 9), (30.5, 6), align=None)
    extrude(amount=EXTRUDE_15_DEPTH)

    # 草图59 → 切除-拉伸34 (cut)
    with BuildSketch(Plane.XZ.offset(-53.686326975)):
        Polygon((22, 29), (19, 29), (19, 7.5), (26, 7.5), (26, 32), (19, 32), (19, 30.5), (22, 30.5), align=None)
    extrude(amount=-CUT_EXTRUDE_34_DEPTH, mode=Mode.SUBTRACT)

    # 草图60 → 切除-拉伸35 (cut, through all)
    with BuildSketch(Plane(origin=(26, 0, 0), x_dir=(0, 0, -1), z_dir=(1, 0, 0))):
        with Locations((-3.75, 45.736326975)):
            Rectangle(SKETCH_60_W, SKETCH_60_H)
    extrude(amount=-CUT_EXTRUDE_35_DEPTH, mode=Mode.SUBTRACT)

    # 草图61 → 凸台-拉伸16 (add)
    with BuildSketch(Plane(origin=(0, 0, 10.7), x_dir=(-1, 0, 0), z_dir=(0, 0, -1))):
        Polygon((-19, 31.686326975), (-20.7, 31.686326975), (-20.7, 42.686326975), (-25.3, 42.686326975), (-25.3, 28.686326975), (-26, 28.686326975), (-26, 25.686326975), (-19, 25.686326975), align=None)
    extrude(amount=EXTRUDE_16_DEPTH)

    # 草图62 → 切除-拉伸37 (cut)
    with BuildSketch(Plane.XY.offset(30.3)):
        Polygon((19, 26), (22, 26), (22, 25.686326975), (26, 25.686326975), (26, 28.686326975), (25.3, 28.686326975), (25.3, 42.686326975), (20.7, 42.686326975), (20.7, 31.686326975), (19, 31.686326975), align=None)
    extrude(amount=-CUT_EXTRUDE_37_DEPTH, mode=Mode.SUBTRACT)

    # 草图63 → 切除-拉伸38 (cut, through all)
    with BuildSketch(Plane(origin=(22, 0, 0), x_dir=(0, 0, -1), z_dir=(1, 0, 0))):
        with Locations((-25.9, 25.843163488)):
            Rectangle(SKETCH_63_W, SKETCH_63_H)
    extrude(amount=-CUT_EXTRUDE_38_DEPTH, mode=Mode.SUBTRACT)

    # 草图66 → 切除-拉伸39 (cut)
    with BuildSketch(Plane.XY):
        with Locations((22.5, 45.736326975)):
            Rectangle(SKETCH_66_W, SKETCH_66_H)
    extrude(amount=-CUT_EXTRUDE_39_DEPTH, mode=Mode.SUBTRACT)

    # 草图67 → 凸台-拉伸17 (add)
    with BuildSketch(Plane(origin=(0, 0, 3.2), x_dir=(-1, 0, 0), z_dir=(0, 0, -1))):
        Polygon((-19, 25.686326975), (-19, 31.686326975), (-20.7, 31.686326975), (-20.7, 42.686326975), (-25.3, 42.686326975), (-25.3, 28.686326975), (-26, 28.686326975), (-26, 25.686326975), align=None)
    extrude(amount=EXTRUDE_17_DEPTH)

    # 草图68 → 切除-拉伸40 (cut)
    with BuildSketch(Plane.XY.offset(22.8)):
        Polygon((19, 31.686326975), (19, 25.686326975), (26, 25.686326975), (26, 28.686326975), (25.3, 28.686326975), (25.3, 42.686326975), (20.7, 42.686326975), (20.7, 31.686326975), align=None)
    extrude(amount=-CUT_EXTRUDE_40_DEPTH, mode=Mode.SUBTRACT)

    # 草图70 → 凸台-拉伸18 (add)
    with BuildSketch(Plane(origin=(0, 25.686326975, 0), x_dir=(1, 0, 0), z_dir=(0, 1, 0))):
        Polygon((19, -22.8), (26, -22.8), (26, -32), (19, -32), (19, -30.5), (22, -30.5), (22, -29), (19, -29), align=None)
    extrude(amount=EXTRUDE_18_DEPTH)

    # 草图71 → 凸台-拉伸19 (add)
    with BuildSketch(Plane(origin=(0, 42.686326975, 0), x_dir=(1, 0, 0), z_dir=(0, 1, 0))):
        with Locations((23, -9.8)):
            Rectangle(SKETCH_71_W, SKETCH_71_H)
    extrude(amount=EXTRUDE_19_DEPTH)

    # 草图72 → 凸台-拉伸20 (add)
    with BuildSketch(Plane(origin=(0, 28.686326975, 0), x_dir=(1, 0, 0), z_dir=(0, 1, 0))):
        with Locations((25.65, -9.8)):
            Rectangle(SKETCH_72_W, SKETCH_72_H)
    extrude(amount=EXTRUDE_20_DEPTH)

    # 草图73 → 凸台-拉伸21 (add)
    with BuildSketch(Plane(origin=(0, 31.686326975, 0), x_dir=(1, 0, 0), z_dir=(0, 1, 0))):
        with Locations((19.85, -9.8)):
            Rectangle(SKETCH_73_W, SKETCH_73_H)
    extrude(amount=EXTRUDE_21_DEPTH)

    # 草图74 → 切除-拉伸41 (cut)
    with BuildSketch(Plane.XZ.offset(-65.786326975)):
        with Locations((22.5, 9.8)):
            Rectangle(SKETCH_74_W, SKETCH_74_H)
    extrude(amount=-CUT_EXTRUDE_41_DEPTH, mode=Mode.SUBTRACT)

    # 草图75 → 切除-拉伸42 (cut)
    with BuildSketch(Plane.XZ.offset(-70.786326975)):
        with Locations((22.5, 9.8)):
            Rectangle(SKETCH_75_W, SKETCH_75_H)
    extrude(amount=-CUT_EXTRUDE_42_DEPTH, mode=Mode.SUBTRACT)

    # 草图76 → 凸台-拉伸22 (add)
    with BuildSketch(Plane(origin=(0, 25.686326975, 0), x_dir=(1, 0, 0), z_dir=(0, 1, 0))):
        with Locations((22.5, 1.6)):
            Rectangle(SKETCH_76_W, SKETCH_76_H)
    extrude(amount=EXTRUDE_22_DEPTH)

    # 草图77 → 凸台-拉伸23 (add)
    with BuildSketch(Plane(origin=(0, 25.686326975, 0), x_dir=(1, 0, 0), z_dir=(0, 1, 0))):
        with Locations((22.5, -21.2)):
            Rectangle(SKETCH_77_W, SKETCH_77_H)
    extrude(amount=EXTRUDE_23_DEPTH)

    # 草图78 → 切除-拉伸43 (cut, two sides: drawn at the far end of the back side and taken through both)
    with BuildSketch(Plane(origin=(0, 0, 31), x_dir=(-1, 0, 0), z_dir=(0, 0, -1)).offset(-CUT_EXTRUDE_43_DEPTH_BACK)):
        Polygon((-48.257359313, 97), (-26, 74.742640687), (-26, 97), align=None)
    extrude(amount=CUT_EXTRUDE_43_DEPTH + CUT_EXTRUDE_43_DEPTH_BACK, mode=Mode.SUBTRACT)

    # 草图79 → 切除-拉伸44 (cut)
    with BuildSketch(Plane(origin=(48.5, 0, 0), x_dir=(0, 0, -1), z_dir=(1, 0, 0))):
        with Locations((0, 7)):
            Rectangle(SKETCH_79_W, SKETCH_79_H)
    extrude(amount=-CUT_EXTRUDE_44_DEPTH, mode=Mode.SUBTRACT)

    # 草图80 → 切除-拉伸45 (cut)
    with BuildSketch(Plane.XY.offset(-4)):
        with Locations((51, 7)):
            Rectangle(SKETCH_80_W, SKETCH_80_H)
    extrude(amount=-CUT_EXTRUDE_45_DEPTH, mode=Mode.SUBTRACT)

    # 草图81 → 切除-拉伸46 (cut)
    with BuildSketch(Plane(origin=(0, 0, 4), x_dir=(-1, 0, 0), z_dir=(0, 0, -1))):
        with Locations((-51, 7)):
            Rectangle(SKETCH_81_W, SKETCH_81_H)
    extrude(amount=-CUT_EXTRUDE_46_DEPTH, mode=Mode.SUBTRACT)

    # 草图82 → 切除-拉伸47 (cut)
    with BuildSketch(Plane.ZY.offset(-56.5)):
        with Locations((0, 7)):
            Rectangle(SKETCH_82_W, SKETCH_82_H)
    extrude(amount=-CUT_EXTRUDE_47_DEPTH, mode=Mode.SUBTRACT)

    # 草图83 → 切除-拉伸48 (cut)
    with BuildSketch(Plane(origin=(0, 5, 0), x_dir=(1, 0, 0), z_dir=(0, 1, 0))):
        with Locations((52.5, 0)):
            Rectangle(SKETCH_83_W, SKETCH_83_H)
    extrude(amount=-CUT_EXTRUDE_48_DEPTH, mode=Mode.SUBTRACT)

    # 草图84 → 凸台-拉伸24 (add)
    with BuildSketch(Plane.ZY.offset(4)):
        with Locations((0, 98.5)):
            Rectangle(SKETCH_84_W, SKETCH_84_H)
    extrude(amount=EXTRUDE_24_DEPTH)

    # 草图85 → 凸台-拉伸25 (add)
    with BuildSketch(Plane.ZY.offset(4)):
        Polygon((30.5, 6), (29, 6), (29, 9), (-29, 9), (-29, 6), (-30.5, 6), (-30.5, 9), (-32, 9), (-32, 0), (32, 0), (32, 9), (30.5, 9), align=None)
    extrude(amount=EXTRUDE_25_DEPTH)

    # 草图86 → 凸台-拉伸26 (add)
    with BuildSketch(Plane.ZY.offset(19)):
        Polygon((30.5, 9), (30.5, 6), (29, 6), (29, 9), (-29, 9), (-29, 6), (-30.5, 6), (-30.5, 9), (-32, 9), (-32, 0), (32, 0), (32, 9), align=None)
    extrude(amount=-EXTRUDE_26_DEPTH)

    # 草图87 → 切除-拉伸49 (cut, through all)
    with BuildSketch(Plane(origin=(0, 0, -32), x_dir=(-1, 0, 0), z_dir=(0, 0, -1))):
        with Locations((17, 9)):
            Circle(SKETCH_87_R)
    extrude(amount=-CUT_EXTRUDE_49_DEPTH, mode=Mode.SUBTRACT)


solid = part.part
